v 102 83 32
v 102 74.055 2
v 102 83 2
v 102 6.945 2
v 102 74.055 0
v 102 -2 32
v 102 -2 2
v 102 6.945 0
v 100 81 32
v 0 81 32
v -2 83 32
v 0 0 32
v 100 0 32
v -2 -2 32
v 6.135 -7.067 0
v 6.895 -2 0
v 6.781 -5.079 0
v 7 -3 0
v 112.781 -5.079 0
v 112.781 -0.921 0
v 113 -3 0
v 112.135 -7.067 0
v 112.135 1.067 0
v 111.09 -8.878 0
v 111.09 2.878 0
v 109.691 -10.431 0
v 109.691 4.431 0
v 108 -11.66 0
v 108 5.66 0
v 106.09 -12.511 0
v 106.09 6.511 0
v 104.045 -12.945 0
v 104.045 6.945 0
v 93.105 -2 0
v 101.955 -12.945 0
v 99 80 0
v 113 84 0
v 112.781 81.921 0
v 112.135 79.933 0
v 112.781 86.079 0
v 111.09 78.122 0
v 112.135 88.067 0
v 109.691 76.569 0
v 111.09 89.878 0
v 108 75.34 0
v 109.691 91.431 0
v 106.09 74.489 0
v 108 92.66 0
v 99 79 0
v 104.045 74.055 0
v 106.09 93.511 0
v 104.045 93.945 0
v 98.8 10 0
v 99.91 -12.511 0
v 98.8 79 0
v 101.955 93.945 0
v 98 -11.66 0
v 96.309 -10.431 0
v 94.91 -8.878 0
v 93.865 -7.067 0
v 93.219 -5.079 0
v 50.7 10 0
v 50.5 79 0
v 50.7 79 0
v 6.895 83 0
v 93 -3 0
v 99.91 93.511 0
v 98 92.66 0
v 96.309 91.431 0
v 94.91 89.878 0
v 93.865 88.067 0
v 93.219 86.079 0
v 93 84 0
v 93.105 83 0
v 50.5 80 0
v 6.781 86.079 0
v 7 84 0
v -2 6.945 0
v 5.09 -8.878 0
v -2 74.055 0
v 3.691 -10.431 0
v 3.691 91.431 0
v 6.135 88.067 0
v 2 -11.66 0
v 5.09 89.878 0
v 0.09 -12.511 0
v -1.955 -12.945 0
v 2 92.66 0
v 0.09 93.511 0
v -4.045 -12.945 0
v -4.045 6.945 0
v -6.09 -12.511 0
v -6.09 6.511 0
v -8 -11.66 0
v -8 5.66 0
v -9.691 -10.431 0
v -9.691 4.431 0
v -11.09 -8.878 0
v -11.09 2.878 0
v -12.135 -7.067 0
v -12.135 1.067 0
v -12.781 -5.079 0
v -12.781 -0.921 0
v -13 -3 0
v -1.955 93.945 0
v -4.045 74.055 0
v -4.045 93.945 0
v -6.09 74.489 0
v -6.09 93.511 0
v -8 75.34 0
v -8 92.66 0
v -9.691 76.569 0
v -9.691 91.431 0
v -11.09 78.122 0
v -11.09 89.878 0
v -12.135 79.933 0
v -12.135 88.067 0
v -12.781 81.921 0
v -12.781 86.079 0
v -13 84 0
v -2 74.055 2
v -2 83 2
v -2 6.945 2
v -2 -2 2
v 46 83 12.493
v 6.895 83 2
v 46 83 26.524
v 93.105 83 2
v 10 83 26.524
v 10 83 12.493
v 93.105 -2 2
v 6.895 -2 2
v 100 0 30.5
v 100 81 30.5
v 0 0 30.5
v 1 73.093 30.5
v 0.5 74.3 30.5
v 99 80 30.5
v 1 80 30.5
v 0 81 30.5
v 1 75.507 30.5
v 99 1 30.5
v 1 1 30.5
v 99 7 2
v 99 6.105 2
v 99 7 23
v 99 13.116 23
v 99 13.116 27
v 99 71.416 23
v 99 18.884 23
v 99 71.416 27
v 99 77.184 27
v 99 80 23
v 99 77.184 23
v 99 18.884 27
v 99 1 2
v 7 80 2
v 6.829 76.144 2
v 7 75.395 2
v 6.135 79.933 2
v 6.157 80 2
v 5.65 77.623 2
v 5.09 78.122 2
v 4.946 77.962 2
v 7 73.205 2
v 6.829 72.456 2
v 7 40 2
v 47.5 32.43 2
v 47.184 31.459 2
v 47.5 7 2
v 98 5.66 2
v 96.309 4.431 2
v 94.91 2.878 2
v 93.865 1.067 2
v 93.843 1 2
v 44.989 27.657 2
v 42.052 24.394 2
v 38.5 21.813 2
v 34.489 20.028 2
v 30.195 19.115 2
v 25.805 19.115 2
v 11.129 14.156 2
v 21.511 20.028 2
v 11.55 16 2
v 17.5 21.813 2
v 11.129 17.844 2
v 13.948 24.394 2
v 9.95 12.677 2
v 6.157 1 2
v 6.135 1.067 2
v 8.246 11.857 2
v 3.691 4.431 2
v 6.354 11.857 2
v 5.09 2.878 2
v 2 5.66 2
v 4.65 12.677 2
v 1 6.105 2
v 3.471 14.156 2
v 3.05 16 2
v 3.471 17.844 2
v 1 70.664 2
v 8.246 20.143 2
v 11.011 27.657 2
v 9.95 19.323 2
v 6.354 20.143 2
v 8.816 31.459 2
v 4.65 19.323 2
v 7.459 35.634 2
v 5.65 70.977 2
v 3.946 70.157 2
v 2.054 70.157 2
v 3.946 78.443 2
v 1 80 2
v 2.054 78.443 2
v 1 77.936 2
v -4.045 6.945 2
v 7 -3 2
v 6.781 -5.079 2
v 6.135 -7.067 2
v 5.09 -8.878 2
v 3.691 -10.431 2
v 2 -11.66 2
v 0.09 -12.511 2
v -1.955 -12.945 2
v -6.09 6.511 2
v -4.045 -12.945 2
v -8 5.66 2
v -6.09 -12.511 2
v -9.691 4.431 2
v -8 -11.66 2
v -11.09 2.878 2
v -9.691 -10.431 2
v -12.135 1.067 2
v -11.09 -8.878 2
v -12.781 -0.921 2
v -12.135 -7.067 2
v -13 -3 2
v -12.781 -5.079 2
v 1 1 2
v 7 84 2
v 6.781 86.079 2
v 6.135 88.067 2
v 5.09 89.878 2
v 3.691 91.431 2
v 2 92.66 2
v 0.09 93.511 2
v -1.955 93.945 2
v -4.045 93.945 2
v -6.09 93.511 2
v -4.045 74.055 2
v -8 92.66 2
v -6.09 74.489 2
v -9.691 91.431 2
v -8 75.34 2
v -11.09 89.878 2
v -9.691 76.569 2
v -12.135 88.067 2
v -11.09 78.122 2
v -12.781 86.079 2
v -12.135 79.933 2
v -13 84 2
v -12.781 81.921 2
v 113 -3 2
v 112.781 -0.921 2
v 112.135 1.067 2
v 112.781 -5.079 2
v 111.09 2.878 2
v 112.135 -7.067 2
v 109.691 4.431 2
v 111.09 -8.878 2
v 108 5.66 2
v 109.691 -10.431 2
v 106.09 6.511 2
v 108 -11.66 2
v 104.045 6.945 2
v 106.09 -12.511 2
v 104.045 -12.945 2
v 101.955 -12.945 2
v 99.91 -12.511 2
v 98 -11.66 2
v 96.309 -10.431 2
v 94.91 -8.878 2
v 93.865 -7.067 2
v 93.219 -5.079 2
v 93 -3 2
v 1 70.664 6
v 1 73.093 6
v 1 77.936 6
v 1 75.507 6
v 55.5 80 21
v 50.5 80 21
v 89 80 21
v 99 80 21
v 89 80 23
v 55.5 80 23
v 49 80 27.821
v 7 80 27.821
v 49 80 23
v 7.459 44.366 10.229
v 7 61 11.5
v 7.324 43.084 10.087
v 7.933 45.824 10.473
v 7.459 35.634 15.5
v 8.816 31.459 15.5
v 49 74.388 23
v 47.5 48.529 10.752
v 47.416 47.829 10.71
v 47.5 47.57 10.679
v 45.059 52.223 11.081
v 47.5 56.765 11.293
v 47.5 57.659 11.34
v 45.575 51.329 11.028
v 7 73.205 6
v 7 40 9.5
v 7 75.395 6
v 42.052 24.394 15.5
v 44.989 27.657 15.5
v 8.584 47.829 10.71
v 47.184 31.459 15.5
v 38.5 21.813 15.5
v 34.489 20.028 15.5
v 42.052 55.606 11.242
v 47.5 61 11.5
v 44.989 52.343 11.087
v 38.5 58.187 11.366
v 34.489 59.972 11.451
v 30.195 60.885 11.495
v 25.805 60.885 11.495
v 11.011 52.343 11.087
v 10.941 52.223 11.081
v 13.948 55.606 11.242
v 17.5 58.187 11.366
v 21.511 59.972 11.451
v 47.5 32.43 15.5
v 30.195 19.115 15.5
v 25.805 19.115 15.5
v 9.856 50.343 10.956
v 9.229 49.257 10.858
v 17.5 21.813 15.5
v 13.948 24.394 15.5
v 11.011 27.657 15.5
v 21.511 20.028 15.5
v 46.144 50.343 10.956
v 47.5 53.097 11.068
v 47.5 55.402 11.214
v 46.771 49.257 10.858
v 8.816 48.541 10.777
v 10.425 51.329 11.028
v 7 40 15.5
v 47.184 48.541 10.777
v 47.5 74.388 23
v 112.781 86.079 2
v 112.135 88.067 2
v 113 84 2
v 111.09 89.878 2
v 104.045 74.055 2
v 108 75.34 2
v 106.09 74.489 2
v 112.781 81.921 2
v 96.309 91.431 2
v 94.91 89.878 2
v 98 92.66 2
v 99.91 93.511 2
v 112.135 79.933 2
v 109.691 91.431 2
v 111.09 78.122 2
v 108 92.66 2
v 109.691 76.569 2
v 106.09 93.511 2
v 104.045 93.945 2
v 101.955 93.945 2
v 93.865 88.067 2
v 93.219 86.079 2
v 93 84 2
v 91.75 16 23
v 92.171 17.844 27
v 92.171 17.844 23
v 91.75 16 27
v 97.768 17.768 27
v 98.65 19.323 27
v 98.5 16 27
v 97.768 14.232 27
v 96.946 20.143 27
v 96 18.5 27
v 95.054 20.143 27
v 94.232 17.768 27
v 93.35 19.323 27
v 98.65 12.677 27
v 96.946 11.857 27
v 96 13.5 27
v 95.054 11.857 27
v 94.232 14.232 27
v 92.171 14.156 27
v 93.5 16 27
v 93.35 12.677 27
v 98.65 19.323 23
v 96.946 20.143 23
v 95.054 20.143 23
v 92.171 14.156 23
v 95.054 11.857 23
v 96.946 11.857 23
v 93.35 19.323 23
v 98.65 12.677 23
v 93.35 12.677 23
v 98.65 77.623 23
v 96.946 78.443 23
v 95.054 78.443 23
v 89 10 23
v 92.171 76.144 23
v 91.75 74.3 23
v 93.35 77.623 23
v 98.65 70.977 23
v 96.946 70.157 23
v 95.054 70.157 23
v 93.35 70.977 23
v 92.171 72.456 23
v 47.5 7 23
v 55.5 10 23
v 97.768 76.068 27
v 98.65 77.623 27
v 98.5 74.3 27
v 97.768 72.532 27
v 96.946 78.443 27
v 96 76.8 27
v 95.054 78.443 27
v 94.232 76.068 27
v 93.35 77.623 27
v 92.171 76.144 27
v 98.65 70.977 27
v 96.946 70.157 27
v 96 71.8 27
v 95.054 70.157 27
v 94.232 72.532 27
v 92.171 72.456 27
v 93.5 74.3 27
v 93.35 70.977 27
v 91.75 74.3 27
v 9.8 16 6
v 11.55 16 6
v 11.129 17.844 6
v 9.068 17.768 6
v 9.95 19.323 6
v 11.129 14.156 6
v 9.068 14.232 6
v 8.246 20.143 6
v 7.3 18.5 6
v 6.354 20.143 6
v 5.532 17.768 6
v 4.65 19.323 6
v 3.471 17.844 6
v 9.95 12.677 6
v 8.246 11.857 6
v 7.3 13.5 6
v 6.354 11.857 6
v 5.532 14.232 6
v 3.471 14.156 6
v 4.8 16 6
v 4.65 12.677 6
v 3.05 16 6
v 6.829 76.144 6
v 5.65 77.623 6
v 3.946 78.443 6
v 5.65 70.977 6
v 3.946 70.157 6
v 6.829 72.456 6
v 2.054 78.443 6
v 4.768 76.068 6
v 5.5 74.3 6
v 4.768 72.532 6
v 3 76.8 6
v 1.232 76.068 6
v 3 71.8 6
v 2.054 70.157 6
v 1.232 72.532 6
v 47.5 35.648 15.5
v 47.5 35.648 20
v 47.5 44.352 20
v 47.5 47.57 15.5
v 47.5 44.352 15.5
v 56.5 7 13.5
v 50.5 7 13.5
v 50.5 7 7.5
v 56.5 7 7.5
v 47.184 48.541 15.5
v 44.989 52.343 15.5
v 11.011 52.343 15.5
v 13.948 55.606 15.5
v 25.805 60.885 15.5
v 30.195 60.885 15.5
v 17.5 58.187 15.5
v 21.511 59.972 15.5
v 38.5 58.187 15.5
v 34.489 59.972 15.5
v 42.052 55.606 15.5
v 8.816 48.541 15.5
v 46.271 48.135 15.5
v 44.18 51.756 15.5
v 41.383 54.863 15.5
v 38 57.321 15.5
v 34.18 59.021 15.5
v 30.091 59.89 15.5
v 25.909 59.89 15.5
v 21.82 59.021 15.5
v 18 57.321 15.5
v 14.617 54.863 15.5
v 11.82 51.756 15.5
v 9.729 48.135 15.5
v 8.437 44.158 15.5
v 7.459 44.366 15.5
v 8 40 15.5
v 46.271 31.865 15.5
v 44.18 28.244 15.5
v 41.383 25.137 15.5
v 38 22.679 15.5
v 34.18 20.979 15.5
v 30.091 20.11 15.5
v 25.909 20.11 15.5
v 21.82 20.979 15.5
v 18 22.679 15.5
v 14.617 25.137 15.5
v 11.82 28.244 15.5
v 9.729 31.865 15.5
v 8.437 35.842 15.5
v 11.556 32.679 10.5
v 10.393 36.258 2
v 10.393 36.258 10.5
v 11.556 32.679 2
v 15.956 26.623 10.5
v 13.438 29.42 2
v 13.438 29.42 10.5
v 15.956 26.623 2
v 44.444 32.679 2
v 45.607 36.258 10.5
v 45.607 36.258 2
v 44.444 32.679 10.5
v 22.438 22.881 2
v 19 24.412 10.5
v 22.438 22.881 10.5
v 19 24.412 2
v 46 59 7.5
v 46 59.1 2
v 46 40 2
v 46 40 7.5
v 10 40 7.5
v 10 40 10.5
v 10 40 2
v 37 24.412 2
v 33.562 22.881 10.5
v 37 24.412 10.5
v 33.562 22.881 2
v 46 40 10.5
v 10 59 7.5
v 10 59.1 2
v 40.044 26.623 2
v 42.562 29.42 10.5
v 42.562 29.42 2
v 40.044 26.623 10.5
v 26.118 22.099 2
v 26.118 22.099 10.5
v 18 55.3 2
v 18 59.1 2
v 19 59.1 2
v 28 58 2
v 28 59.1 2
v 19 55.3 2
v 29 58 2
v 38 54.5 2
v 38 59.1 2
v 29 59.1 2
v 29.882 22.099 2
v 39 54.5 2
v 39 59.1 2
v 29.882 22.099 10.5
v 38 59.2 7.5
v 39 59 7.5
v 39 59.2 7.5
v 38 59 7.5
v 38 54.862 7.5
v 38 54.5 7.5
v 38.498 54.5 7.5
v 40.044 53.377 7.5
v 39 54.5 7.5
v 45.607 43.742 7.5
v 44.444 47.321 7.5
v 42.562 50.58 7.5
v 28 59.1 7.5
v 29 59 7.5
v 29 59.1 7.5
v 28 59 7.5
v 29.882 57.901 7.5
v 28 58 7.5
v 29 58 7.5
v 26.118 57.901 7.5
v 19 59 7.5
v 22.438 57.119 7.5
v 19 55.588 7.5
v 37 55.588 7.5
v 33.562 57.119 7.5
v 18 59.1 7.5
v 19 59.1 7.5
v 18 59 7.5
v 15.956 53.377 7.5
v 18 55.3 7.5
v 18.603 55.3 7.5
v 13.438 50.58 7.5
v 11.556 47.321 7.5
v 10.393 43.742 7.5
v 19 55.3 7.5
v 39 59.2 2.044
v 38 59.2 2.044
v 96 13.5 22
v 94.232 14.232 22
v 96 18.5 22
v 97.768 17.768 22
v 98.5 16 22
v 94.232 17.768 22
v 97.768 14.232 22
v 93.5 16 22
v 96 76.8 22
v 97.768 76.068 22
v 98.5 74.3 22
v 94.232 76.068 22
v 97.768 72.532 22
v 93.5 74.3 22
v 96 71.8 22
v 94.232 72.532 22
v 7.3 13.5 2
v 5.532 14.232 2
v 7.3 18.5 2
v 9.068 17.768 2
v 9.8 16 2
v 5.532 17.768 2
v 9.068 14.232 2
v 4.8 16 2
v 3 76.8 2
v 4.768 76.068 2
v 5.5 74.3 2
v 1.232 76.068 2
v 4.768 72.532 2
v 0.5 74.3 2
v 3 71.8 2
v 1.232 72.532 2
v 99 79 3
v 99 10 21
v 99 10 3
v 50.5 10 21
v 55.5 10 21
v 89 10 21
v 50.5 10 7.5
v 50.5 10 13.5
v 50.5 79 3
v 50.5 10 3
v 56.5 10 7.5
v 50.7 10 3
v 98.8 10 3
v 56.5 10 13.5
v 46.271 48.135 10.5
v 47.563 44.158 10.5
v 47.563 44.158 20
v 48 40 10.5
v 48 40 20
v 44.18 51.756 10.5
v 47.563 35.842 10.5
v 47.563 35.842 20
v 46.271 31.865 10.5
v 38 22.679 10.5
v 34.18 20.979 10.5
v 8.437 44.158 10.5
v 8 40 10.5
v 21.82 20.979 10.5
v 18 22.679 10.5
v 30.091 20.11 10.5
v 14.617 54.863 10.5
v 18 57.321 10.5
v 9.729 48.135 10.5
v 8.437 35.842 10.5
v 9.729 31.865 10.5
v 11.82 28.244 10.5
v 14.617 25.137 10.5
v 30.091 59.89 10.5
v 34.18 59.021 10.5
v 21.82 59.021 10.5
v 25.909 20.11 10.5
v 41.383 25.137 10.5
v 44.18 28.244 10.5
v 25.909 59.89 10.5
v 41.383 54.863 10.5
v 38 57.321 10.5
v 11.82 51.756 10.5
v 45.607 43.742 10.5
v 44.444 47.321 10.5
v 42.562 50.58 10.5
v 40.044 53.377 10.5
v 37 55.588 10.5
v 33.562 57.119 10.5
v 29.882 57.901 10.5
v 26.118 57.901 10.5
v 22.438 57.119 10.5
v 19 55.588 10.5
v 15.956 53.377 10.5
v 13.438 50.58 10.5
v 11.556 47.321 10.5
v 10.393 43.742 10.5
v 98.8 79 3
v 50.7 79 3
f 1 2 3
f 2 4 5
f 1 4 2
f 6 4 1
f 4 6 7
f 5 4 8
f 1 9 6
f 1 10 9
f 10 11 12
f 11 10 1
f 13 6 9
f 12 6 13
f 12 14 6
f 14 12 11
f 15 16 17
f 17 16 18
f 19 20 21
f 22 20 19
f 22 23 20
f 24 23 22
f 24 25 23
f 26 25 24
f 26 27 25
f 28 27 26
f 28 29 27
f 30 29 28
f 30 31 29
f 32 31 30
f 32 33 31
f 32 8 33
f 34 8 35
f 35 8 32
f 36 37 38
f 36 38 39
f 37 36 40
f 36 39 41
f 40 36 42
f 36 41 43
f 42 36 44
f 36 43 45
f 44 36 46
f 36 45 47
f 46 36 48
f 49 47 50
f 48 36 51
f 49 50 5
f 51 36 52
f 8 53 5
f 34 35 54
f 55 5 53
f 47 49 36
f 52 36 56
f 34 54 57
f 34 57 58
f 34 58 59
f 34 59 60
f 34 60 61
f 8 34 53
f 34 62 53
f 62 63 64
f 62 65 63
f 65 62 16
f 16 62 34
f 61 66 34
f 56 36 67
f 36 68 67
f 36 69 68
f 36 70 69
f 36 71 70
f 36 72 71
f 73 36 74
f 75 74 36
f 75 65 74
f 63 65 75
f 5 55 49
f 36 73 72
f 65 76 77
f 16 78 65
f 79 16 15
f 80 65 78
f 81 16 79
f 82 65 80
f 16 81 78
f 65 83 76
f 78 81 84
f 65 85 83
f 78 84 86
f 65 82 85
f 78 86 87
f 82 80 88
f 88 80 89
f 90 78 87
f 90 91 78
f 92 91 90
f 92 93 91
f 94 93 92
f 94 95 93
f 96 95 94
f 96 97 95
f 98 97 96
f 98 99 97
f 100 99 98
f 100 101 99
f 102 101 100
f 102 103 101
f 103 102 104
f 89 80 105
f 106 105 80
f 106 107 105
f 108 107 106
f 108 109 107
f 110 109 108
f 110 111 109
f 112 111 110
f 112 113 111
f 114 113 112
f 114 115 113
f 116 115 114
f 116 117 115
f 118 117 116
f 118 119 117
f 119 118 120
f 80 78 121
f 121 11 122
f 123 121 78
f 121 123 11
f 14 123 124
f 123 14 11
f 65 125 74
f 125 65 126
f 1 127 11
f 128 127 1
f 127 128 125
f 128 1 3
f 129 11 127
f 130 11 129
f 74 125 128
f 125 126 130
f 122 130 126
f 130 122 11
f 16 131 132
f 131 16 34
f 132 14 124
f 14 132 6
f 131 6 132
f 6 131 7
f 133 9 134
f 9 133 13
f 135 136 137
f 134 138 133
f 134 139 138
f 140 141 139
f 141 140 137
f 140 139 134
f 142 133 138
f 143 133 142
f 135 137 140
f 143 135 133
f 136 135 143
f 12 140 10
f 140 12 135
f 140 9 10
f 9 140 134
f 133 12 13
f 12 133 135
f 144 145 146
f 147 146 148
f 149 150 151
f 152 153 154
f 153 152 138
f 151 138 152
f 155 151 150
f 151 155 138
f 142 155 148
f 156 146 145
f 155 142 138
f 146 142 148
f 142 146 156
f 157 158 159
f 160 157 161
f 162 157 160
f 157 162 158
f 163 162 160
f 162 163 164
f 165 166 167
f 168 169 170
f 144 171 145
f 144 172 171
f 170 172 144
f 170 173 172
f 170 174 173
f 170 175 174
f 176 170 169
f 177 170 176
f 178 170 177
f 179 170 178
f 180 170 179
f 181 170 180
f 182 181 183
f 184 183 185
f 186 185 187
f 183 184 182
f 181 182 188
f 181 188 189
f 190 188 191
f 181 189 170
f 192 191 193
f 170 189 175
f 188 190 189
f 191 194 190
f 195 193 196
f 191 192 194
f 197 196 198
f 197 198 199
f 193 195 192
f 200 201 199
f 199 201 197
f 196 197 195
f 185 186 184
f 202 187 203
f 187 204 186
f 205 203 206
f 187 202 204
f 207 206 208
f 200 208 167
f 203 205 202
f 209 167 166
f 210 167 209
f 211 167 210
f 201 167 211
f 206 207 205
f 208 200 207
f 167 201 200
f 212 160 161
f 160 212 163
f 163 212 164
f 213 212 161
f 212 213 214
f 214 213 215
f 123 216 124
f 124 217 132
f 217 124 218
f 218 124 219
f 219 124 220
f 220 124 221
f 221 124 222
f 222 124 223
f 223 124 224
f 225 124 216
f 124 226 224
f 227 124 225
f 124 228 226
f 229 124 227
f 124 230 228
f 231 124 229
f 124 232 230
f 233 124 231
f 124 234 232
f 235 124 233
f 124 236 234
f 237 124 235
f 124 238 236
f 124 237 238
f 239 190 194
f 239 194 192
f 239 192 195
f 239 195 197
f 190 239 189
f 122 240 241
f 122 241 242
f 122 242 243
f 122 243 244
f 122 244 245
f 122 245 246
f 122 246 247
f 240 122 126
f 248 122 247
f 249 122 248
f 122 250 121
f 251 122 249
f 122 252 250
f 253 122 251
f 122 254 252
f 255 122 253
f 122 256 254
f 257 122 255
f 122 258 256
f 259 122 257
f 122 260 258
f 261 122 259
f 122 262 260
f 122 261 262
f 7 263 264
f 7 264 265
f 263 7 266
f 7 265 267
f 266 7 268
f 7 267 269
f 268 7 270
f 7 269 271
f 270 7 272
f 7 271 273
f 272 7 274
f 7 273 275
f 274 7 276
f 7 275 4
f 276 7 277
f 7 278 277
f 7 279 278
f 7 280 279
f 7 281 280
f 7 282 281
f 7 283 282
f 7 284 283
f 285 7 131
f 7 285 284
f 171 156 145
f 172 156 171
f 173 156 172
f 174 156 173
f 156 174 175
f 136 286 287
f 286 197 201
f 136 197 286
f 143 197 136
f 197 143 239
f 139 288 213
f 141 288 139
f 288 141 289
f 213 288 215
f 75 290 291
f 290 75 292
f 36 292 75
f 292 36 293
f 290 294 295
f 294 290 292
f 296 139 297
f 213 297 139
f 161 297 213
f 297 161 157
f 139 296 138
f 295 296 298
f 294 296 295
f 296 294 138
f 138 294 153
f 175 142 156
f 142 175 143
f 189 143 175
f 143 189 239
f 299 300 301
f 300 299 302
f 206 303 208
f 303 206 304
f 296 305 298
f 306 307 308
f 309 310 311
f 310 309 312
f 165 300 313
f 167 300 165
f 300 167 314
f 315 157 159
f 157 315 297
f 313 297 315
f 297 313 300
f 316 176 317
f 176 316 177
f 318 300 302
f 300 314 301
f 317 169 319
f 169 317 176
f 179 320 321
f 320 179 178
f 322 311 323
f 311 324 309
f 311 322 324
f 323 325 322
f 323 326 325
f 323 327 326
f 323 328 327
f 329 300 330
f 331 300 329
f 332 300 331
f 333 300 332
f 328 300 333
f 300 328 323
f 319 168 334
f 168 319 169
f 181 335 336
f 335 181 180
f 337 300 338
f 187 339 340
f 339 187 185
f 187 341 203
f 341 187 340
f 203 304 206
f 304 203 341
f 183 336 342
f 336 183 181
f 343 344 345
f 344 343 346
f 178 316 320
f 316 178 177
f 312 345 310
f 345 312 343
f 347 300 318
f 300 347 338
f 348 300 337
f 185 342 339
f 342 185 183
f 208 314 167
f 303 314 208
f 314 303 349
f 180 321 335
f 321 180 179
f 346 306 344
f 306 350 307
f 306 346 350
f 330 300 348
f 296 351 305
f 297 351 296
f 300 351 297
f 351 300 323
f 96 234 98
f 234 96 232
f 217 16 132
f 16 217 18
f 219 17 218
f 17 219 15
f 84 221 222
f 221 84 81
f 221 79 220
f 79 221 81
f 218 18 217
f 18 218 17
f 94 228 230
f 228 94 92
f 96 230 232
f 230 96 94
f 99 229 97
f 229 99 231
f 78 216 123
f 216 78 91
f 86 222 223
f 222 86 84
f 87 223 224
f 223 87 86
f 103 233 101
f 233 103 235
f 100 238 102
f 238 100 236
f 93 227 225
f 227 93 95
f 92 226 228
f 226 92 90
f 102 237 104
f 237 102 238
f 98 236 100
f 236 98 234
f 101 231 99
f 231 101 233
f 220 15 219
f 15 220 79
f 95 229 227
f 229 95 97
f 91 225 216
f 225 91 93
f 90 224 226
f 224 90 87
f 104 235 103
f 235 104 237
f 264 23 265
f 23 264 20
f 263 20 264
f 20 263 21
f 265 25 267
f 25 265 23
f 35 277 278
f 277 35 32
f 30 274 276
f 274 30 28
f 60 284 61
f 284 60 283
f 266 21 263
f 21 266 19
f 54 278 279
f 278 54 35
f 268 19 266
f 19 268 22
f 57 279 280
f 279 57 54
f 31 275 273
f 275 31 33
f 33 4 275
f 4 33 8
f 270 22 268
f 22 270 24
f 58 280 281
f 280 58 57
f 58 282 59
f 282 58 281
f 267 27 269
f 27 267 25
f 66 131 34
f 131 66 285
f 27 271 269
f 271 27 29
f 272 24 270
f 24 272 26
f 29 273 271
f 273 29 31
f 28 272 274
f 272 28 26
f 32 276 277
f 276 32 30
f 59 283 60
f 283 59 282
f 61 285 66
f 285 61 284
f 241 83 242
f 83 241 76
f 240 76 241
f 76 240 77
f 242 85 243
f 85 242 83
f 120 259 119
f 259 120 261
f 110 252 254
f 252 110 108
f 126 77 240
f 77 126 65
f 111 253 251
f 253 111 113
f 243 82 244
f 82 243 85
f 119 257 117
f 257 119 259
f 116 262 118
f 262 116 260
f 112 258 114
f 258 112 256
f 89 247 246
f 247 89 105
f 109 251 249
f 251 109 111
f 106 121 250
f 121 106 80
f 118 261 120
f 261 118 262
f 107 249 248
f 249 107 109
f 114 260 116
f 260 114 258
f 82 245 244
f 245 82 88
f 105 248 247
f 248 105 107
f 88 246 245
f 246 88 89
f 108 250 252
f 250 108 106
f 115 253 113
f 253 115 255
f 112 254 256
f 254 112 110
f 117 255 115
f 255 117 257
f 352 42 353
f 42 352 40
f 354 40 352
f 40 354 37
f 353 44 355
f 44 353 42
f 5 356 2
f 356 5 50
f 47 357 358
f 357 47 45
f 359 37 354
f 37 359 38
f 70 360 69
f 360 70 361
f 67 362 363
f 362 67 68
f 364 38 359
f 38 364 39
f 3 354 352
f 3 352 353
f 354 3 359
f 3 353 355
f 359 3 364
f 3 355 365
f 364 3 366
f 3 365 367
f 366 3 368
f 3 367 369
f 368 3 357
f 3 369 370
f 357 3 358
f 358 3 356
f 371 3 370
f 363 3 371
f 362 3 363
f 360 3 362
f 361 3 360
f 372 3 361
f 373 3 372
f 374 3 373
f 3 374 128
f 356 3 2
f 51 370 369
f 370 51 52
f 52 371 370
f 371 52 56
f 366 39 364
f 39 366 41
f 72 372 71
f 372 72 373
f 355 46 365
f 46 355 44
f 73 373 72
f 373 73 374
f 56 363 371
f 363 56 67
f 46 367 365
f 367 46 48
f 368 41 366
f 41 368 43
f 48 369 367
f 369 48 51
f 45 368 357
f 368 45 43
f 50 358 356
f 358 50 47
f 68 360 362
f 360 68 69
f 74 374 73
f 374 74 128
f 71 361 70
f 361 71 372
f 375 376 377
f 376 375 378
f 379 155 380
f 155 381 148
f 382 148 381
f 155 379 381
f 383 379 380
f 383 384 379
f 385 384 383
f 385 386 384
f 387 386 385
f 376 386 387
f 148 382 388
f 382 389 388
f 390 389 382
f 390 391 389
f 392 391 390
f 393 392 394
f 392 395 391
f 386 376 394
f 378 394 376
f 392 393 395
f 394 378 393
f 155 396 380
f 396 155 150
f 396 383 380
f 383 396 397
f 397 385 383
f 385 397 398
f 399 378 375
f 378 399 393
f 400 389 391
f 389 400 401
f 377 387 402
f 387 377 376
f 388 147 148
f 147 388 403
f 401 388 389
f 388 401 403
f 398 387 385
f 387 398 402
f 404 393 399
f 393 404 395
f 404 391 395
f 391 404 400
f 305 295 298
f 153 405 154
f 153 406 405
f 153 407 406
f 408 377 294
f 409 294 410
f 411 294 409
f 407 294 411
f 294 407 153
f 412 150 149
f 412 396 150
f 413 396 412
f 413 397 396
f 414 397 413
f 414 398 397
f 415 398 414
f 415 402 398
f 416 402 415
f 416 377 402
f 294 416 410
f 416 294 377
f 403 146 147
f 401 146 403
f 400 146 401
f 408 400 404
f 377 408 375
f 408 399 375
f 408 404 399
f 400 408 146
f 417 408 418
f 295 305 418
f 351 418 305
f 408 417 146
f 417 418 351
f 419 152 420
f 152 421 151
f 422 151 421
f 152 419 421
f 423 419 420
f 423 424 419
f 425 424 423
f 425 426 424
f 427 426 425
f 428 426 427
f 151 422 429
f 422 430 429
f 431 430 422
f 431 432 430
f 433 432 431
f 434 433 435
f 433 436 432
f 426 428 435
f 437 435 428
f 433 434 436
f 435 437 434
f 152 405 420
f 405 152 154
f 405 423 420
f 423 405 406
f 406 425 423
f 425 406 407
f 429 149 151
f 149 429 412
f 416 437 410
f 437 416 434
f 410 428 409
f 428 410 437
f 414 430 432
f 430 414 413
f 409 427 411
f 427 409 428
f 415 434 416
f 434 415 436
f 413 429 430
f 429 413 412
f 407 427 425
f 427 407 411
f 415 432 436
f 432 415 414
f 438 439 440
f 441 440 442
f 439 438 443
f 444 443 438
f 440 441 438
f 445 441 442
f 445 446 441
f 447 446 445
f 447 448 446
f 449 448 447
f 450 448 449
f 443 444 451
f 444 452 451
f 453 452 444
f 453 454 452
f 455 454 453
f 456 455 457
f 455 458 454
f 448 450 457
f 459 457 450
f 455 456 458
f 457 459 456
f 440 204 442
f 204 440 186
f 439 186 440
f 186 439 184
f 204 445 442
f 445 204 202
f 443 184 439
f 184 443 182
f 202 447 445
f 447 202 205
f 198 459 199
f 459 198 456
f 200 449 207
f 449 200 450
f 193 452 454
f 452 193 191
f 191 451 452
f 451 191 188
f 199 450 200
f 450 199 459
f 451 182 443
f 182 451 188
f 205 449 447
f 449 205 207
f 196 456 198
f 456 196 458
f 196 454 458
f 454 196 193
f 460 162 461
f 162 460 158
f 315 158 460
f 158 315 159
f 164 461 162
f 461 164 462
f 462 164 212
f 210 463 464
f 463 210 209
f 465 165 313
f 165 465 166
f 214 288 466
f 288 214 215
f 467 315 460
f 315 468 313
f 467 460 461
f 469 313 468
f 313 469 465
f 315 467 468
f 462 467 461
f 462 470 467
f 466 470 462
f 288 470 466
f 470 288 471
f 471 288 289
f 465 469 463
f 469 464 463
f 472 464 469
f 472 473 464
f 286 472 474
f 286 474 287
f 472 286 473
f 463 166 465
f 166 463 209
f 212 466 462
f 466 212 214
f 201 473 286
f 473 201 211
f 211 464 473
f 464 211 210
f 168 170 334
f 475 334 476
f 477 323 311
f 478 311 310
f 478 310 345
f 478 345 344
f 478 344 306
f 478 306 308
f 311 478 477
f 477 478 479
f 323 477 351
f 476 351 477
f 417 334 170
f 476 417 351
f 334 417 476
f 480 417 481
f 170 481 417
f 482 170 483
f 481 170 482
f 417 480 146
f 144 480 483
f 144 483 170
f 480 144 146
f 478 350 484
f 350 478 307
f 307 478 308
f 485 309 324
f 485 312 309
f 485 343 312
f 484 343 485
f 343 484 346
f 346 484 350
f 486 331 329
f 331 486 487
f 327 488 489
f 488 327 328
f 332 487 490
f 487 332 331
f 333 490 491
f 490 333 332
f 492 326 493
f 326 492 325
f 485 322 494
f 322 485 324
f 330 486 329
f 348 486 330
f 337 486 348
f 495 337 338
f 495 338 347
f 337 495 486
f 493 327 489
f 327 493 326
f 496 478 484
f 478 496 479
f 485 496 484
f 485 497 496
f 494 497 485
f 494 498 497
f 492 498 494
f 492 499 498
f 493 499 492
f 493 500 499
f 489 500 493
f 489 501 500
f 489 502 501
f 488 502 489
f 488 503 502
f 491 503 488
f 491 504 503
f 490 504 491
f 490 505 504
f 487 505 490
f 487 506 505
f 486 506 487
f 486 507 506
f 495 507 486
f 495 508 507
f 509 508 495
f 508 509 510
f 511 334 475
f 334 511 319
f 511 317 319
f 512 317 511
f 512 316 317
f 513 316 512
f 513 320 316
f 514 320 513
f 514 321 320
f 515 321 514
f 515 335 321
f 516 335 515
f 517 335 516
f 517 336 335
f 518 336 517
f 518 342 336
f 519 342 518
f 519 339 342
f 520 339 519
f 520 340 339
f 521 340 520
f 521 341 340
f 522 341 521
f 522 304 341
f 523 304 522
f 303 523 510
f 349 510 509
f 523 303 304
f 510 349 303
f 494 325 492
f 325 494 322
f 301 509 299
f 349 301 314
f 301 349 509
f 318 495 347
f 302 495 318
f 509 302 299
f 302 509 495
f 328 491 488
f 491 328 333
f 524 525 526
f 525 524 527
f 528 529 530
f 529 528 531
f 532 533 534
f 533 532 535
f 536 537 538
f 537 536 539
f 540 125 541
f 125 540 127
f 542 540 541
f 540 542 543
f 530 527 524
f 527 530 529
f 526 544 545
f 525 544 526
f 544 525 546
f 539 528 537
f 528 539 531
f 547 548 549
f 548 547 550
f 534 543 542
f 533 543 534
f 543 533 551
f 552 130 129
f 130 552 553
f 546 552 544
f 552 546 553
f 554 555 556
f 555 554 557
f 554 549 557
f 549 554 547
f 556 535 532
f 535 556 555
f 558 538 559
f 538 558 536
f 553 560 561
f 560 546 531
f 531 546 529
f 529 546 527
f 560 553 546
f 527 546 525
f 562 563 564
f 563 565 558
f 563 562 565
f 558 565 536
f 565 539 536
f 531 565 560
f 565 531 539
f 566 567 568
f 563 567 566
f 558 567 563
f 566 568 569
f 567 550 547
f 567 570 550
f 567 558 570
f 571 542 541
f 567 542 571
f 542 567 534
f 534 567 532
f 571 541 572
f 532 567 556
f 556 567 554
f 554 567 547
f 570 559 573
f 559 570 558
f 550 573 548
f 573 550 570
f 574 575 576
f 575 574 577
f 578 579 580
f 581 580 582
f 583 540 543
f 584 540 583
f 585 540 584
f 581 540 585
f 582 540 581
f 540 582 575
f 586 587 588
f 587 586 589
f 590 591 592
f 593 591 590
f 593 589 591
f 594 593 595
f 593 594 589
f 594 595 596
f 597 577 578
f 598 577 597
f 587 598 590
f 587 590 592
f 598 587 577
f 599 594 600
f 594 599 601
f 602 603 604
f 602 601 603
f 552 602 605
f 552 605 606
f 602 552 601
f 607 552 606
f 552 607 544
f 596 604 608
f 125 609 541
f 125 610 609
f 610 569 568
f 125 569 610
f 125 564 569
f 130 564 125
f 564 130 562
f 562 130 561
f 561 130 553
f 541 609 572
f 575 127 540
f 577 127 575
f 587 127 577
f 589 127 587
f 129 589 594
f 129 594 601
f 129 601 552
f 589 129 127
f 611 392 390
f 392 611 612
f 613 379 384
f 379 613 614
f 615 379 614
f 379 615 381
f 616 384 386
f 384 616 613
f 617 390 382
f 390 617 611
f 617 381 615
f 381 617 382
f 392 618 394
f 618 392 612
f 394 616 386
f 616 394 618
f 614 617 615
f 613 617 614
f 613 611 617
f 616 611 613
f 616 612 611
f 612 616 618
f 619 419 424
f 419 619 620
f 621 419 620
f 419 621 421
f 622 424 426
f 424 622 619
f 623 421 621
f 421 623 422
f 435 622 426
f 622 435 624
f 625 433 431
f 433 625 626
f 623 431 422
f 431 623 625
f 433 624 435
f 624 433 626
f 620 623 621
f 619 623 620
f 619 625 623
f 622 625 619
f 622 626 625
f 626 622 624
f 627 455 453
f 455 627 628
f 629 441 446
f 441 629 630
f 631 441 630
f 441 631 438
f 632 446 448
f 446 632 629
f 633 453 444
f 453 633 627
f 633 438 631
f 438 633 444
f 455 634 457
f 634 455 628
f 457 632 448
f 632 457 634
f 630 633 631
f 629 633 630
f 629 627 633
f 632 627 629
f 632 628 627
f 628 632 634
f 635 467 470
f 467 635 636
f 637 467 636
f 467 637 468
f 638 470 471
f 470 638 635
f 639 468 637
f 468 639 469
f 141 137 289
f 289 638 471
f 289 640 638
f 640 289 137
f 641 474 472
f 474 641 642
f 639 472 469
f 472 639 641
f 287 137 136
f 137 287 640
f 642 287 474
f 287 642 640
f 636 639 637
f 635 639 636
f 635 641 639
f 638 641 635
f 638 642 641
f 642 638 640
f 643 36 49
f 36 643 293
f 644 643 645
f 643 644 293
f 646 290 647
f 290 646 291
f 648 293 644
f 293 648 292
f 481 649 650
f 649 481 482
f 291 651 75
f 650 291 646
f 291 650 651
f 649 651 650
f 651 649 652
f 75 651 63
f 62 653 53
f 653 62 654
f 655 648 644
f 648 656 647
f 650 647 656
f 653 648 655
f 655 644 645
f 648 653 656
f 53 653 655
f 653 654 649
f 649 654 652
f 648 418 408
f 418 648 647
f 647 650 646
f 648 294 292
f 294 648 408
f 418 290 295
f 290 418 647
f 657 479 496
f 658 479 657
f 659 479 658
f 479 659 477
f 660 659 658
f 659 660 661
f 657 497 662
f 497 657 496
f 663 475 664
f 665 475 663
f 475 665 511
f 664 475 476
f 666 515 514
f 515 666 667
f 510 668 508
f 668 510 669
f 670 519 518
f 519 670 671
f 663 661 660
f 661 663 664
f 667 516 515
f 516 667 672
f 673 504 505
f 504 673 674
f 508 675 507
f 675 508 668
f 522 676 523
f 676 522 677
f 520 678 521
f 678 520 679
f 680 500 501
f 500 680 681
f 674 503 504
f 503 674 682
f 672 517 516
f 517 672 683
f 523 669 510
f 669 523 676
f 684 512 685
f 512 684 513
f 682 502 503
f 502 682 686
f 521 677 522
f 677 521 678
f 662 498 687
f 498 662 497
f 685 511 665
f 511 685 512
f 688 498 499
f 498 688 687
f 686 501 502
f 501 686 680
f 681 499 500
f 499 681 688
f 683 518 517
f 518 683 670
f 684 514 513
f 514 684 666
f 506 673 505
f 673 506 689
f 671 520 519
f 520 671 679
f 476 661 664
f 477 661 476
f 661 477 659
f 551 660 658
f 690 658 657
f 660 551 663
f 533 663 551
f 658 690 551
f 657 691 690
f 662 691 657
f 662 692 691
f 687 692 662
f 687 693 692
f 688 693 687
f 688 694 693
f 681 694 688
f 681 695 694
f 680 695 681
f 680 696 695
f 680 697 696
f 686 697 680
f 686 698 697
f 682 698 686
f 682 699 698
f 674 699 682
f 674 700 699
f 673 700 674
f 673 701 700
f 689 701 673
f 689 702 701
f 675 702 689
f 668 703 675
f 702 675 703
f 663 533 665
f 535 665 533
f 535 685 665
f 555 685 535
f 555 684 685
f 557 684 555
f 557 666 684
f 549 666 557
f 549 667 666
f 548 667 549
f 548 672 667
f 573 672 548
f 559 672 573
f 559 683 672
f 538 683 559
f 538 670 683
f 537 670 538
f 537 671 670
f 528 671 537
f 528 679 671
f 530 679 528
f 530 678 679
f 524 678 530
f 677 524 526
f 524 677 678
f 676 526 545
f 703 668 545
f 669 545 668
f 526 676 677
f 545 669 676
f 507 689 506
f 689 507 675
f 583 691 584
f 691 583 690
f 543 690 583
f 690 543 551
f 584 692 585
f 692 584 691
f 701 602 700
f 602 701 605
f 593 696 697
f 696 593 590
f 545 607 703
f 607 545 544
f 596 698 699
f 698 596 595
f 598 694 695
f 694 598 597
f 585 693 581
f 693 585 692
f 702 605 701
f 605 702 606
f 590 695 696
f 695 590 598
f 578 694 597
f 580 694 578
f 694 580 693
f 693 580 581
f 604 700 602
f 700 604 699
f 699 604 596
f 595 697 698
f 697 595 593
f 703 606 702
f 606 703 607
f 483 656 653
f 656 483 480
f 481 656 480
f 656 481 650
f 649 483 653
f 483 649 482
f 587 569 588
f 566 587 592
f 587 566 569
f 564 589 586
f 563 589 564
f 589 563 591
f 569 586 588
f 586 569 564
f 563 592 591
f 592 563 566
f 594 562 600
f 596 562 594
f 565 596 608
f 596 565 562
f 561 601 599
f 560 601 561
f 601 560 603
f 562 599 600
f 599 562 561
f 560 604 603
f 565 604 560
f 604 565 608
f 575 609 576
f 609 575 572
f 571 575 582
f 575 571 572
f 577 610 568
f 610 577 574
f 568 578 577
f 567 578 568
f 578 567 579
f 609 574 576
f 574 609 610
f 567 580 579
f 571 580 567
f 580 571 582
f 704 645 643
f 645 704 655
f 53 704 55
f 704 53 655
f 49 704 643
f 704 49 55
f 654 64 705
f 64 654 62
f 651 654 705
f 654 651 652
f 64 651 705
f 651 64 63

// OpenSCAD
width = 100;
height = 81;
depth = 30;
wall_thickness = 2;
lip_height = 1.5;

battery_width = 48.5;
battery_height = 70;
battery_depth = 21;

speaker_depth = 19;
speaker_radius = 20;

speaker_height = depth - lip_height - speaker_depth + wall_thickness - 2;

speaker_x = 28;
speaker_y = 40;

module pad(x, y) {
    translate([x, y, 1])
    cylinder(2, 10, 10, true);
}

difference() {
    union() {
        pad(-3, -3);
        pad(width + 3, -3);
        pad(-3, height + 3);
        pad(width + 3, height + 3);
        
        translate([-wall_thickness, -wall_thickness, 0])
        difference() {
            cube([width + wall_thickness * 2, height + wall_thickness * 2, depth + wall_thickness]);
            translate([wall_thickness, wall_thickness, depth + wall_thickness - lip_height]) cube([width, height, depth + 1]);
            translate([wall_thickness + 1, wall_thickness + 1, wall_thickness]) cube([width - 2, height - 2, depth + 1]);
        } 

        translate([96, 16, battery_depth + wall_thickness]) cylinder(4, 8.5 / 2, 8.5 / 2);
        translate([96, 74.3, battery_depth + wall_thickness]) cylinder(4, 8.5 / 2, 8.5 / 2);
        translate([7.3, 16,  wall_thickness]) cylinder(4, 8.5 / 2, 8.5 / 2);
        translate([3, 74.3, wall_thickness]) cylinder(4, 8.5 / 2, 8.5 / 2);
        
        translate([width - battery_width - wall_thickness * 2, height - battery_height - 4, 0])
        cube([battery_width + wall_thickness * 2, battery_height + wall_thickness * 2, battery_depth + wall_thickness]);

        intersection() {
            union() {
                hull() {
                    translate([speaker_x, speaker_y, 0 ])
                    cylinder(speaker_height, speaker_radius + 1, speaker_radius + 1);
                    
                    translate([speaker_x - (speaker_radius + 1), speaker_y + speaker_radius + 1 , 0])
                    cube([(speaker_radius + 1) * 2, .1, speaker_height + 2]);
                }

                hull() {
                    translate([speaker_x - (speaker_radius + 1), speaker_y + speaker_radius + 1 , 0])
                    cube([(speaker_radius + 1) * 2, .1, speaker_height + 2]);

                    translate([speaker_x - (speaker_radius + 1), 100, 0 ])
                    cube([(speaker_radius + 1) * 2, .1, 45]);
                }
            }
            
            cube([width + wall_thickness, height + wall_thickness, depth + wall_thickness]);
        }
        

        
        translate([speaker_x, speaker_y, speaker_height ])
        cylinder(6, speaker_radius + 1, speaker_radius + 1);
    }
    
    translate([96, 16, battery_depth + wall_thickness / 2]) cylinder(10, 5 / 2, 5 / 2);
    translate([96, 74.3, battery_depth + wall_thickness / 2]) cylinder(10, 5 / 2, 5 / 2);
    translate([7.3, 16, wall_thickness]) cylinder(10, 5 / 2, 5 / 2);
    translate([3, 74.3, wall_thickness]) cylinder(depth, 5 / 2, 5 / 2);

    translate([width - battery_width - wall_thickness / 2, height - battery_height - wall_thickness / 2, - 1])
    cube([battery_width, battery_height, battery_depth + 1]);
    
    translate([width - battery_width - wall_thickness / 2 + 5, height - battery_height - wall_thickness / 2, - 1])
    cube([battery_width - 15, battery_height, battery_depth + 5]);



    union() {
        hull() {
            translate([speaker_x, speaker_y, wall_thickness ])
            cylinder(speaker_height - 4, speaker_radius - 2, speaker_radius - 2);
            
            translate([speaker_x - (speaker_radius - 2), speaker_y + speaker_radius - 1 , wall_thickness])
            cube([(speaker_radius - 2) * 2, .1, speaker_height - 4]);
        }

        hull() {
            translate([speaker_x - (speaker_radius - 2), speaker_y + speaker_radius - 1 , wall_thickness])
            cube([(speaker_radius - 2) * 2, .1, speaker_height - 4]);
            
            translate([speaker_x - (speaker_radius - 2), 100, 20 ])
            cube([(speaker_radius - 2) * 2, .1, 20]);
        }
    }

    translate([speaker_x, speaker_y, speaker_height + 1 ])
    cylinder(speaker_height, speaker_radius, speaker_radius);
     
    translate([speaker_x, speaker_y, speaker_height - 2.01 ])
    cylinder(speaker_height, speaker_radius - 2, speaker_radius - 2);
    
    translate([width - battery_width - wall_thickness / 2, height - battery_height - 6, (battery_depth - 6) / 2])
    cube(6);
}


    translate([speaker_x, speaker_y + speaker_radius - 2 , 0])
    cube([1, 1.1, speaker_height - 2]);

    translate([speaker_x - 10, speaker_y + speaker_radius - 4.7 , 0])
    cube([1, 3.8, speaker_height - 2]);

    translate([speaker_x + 10, speaker_y + speaker_radius - 5.5 , 0])
    cube([1, 4.7, speaker_height - 2]);


translate([width - .2 - wall_thickness / 2, height - battery_height - 2, 0])
cube([.2, battery_height, 3]);

translate([width -  battery_width - wall_thickness / 2, height - battery_height - 2, 0])
cube([.2, battery_height, 3]);





/*
color([1,0,0])
translate([25, 35, speaker_height ])
cylinder(speaker_depth, speaker_radius, speaker_radius);   
*/
